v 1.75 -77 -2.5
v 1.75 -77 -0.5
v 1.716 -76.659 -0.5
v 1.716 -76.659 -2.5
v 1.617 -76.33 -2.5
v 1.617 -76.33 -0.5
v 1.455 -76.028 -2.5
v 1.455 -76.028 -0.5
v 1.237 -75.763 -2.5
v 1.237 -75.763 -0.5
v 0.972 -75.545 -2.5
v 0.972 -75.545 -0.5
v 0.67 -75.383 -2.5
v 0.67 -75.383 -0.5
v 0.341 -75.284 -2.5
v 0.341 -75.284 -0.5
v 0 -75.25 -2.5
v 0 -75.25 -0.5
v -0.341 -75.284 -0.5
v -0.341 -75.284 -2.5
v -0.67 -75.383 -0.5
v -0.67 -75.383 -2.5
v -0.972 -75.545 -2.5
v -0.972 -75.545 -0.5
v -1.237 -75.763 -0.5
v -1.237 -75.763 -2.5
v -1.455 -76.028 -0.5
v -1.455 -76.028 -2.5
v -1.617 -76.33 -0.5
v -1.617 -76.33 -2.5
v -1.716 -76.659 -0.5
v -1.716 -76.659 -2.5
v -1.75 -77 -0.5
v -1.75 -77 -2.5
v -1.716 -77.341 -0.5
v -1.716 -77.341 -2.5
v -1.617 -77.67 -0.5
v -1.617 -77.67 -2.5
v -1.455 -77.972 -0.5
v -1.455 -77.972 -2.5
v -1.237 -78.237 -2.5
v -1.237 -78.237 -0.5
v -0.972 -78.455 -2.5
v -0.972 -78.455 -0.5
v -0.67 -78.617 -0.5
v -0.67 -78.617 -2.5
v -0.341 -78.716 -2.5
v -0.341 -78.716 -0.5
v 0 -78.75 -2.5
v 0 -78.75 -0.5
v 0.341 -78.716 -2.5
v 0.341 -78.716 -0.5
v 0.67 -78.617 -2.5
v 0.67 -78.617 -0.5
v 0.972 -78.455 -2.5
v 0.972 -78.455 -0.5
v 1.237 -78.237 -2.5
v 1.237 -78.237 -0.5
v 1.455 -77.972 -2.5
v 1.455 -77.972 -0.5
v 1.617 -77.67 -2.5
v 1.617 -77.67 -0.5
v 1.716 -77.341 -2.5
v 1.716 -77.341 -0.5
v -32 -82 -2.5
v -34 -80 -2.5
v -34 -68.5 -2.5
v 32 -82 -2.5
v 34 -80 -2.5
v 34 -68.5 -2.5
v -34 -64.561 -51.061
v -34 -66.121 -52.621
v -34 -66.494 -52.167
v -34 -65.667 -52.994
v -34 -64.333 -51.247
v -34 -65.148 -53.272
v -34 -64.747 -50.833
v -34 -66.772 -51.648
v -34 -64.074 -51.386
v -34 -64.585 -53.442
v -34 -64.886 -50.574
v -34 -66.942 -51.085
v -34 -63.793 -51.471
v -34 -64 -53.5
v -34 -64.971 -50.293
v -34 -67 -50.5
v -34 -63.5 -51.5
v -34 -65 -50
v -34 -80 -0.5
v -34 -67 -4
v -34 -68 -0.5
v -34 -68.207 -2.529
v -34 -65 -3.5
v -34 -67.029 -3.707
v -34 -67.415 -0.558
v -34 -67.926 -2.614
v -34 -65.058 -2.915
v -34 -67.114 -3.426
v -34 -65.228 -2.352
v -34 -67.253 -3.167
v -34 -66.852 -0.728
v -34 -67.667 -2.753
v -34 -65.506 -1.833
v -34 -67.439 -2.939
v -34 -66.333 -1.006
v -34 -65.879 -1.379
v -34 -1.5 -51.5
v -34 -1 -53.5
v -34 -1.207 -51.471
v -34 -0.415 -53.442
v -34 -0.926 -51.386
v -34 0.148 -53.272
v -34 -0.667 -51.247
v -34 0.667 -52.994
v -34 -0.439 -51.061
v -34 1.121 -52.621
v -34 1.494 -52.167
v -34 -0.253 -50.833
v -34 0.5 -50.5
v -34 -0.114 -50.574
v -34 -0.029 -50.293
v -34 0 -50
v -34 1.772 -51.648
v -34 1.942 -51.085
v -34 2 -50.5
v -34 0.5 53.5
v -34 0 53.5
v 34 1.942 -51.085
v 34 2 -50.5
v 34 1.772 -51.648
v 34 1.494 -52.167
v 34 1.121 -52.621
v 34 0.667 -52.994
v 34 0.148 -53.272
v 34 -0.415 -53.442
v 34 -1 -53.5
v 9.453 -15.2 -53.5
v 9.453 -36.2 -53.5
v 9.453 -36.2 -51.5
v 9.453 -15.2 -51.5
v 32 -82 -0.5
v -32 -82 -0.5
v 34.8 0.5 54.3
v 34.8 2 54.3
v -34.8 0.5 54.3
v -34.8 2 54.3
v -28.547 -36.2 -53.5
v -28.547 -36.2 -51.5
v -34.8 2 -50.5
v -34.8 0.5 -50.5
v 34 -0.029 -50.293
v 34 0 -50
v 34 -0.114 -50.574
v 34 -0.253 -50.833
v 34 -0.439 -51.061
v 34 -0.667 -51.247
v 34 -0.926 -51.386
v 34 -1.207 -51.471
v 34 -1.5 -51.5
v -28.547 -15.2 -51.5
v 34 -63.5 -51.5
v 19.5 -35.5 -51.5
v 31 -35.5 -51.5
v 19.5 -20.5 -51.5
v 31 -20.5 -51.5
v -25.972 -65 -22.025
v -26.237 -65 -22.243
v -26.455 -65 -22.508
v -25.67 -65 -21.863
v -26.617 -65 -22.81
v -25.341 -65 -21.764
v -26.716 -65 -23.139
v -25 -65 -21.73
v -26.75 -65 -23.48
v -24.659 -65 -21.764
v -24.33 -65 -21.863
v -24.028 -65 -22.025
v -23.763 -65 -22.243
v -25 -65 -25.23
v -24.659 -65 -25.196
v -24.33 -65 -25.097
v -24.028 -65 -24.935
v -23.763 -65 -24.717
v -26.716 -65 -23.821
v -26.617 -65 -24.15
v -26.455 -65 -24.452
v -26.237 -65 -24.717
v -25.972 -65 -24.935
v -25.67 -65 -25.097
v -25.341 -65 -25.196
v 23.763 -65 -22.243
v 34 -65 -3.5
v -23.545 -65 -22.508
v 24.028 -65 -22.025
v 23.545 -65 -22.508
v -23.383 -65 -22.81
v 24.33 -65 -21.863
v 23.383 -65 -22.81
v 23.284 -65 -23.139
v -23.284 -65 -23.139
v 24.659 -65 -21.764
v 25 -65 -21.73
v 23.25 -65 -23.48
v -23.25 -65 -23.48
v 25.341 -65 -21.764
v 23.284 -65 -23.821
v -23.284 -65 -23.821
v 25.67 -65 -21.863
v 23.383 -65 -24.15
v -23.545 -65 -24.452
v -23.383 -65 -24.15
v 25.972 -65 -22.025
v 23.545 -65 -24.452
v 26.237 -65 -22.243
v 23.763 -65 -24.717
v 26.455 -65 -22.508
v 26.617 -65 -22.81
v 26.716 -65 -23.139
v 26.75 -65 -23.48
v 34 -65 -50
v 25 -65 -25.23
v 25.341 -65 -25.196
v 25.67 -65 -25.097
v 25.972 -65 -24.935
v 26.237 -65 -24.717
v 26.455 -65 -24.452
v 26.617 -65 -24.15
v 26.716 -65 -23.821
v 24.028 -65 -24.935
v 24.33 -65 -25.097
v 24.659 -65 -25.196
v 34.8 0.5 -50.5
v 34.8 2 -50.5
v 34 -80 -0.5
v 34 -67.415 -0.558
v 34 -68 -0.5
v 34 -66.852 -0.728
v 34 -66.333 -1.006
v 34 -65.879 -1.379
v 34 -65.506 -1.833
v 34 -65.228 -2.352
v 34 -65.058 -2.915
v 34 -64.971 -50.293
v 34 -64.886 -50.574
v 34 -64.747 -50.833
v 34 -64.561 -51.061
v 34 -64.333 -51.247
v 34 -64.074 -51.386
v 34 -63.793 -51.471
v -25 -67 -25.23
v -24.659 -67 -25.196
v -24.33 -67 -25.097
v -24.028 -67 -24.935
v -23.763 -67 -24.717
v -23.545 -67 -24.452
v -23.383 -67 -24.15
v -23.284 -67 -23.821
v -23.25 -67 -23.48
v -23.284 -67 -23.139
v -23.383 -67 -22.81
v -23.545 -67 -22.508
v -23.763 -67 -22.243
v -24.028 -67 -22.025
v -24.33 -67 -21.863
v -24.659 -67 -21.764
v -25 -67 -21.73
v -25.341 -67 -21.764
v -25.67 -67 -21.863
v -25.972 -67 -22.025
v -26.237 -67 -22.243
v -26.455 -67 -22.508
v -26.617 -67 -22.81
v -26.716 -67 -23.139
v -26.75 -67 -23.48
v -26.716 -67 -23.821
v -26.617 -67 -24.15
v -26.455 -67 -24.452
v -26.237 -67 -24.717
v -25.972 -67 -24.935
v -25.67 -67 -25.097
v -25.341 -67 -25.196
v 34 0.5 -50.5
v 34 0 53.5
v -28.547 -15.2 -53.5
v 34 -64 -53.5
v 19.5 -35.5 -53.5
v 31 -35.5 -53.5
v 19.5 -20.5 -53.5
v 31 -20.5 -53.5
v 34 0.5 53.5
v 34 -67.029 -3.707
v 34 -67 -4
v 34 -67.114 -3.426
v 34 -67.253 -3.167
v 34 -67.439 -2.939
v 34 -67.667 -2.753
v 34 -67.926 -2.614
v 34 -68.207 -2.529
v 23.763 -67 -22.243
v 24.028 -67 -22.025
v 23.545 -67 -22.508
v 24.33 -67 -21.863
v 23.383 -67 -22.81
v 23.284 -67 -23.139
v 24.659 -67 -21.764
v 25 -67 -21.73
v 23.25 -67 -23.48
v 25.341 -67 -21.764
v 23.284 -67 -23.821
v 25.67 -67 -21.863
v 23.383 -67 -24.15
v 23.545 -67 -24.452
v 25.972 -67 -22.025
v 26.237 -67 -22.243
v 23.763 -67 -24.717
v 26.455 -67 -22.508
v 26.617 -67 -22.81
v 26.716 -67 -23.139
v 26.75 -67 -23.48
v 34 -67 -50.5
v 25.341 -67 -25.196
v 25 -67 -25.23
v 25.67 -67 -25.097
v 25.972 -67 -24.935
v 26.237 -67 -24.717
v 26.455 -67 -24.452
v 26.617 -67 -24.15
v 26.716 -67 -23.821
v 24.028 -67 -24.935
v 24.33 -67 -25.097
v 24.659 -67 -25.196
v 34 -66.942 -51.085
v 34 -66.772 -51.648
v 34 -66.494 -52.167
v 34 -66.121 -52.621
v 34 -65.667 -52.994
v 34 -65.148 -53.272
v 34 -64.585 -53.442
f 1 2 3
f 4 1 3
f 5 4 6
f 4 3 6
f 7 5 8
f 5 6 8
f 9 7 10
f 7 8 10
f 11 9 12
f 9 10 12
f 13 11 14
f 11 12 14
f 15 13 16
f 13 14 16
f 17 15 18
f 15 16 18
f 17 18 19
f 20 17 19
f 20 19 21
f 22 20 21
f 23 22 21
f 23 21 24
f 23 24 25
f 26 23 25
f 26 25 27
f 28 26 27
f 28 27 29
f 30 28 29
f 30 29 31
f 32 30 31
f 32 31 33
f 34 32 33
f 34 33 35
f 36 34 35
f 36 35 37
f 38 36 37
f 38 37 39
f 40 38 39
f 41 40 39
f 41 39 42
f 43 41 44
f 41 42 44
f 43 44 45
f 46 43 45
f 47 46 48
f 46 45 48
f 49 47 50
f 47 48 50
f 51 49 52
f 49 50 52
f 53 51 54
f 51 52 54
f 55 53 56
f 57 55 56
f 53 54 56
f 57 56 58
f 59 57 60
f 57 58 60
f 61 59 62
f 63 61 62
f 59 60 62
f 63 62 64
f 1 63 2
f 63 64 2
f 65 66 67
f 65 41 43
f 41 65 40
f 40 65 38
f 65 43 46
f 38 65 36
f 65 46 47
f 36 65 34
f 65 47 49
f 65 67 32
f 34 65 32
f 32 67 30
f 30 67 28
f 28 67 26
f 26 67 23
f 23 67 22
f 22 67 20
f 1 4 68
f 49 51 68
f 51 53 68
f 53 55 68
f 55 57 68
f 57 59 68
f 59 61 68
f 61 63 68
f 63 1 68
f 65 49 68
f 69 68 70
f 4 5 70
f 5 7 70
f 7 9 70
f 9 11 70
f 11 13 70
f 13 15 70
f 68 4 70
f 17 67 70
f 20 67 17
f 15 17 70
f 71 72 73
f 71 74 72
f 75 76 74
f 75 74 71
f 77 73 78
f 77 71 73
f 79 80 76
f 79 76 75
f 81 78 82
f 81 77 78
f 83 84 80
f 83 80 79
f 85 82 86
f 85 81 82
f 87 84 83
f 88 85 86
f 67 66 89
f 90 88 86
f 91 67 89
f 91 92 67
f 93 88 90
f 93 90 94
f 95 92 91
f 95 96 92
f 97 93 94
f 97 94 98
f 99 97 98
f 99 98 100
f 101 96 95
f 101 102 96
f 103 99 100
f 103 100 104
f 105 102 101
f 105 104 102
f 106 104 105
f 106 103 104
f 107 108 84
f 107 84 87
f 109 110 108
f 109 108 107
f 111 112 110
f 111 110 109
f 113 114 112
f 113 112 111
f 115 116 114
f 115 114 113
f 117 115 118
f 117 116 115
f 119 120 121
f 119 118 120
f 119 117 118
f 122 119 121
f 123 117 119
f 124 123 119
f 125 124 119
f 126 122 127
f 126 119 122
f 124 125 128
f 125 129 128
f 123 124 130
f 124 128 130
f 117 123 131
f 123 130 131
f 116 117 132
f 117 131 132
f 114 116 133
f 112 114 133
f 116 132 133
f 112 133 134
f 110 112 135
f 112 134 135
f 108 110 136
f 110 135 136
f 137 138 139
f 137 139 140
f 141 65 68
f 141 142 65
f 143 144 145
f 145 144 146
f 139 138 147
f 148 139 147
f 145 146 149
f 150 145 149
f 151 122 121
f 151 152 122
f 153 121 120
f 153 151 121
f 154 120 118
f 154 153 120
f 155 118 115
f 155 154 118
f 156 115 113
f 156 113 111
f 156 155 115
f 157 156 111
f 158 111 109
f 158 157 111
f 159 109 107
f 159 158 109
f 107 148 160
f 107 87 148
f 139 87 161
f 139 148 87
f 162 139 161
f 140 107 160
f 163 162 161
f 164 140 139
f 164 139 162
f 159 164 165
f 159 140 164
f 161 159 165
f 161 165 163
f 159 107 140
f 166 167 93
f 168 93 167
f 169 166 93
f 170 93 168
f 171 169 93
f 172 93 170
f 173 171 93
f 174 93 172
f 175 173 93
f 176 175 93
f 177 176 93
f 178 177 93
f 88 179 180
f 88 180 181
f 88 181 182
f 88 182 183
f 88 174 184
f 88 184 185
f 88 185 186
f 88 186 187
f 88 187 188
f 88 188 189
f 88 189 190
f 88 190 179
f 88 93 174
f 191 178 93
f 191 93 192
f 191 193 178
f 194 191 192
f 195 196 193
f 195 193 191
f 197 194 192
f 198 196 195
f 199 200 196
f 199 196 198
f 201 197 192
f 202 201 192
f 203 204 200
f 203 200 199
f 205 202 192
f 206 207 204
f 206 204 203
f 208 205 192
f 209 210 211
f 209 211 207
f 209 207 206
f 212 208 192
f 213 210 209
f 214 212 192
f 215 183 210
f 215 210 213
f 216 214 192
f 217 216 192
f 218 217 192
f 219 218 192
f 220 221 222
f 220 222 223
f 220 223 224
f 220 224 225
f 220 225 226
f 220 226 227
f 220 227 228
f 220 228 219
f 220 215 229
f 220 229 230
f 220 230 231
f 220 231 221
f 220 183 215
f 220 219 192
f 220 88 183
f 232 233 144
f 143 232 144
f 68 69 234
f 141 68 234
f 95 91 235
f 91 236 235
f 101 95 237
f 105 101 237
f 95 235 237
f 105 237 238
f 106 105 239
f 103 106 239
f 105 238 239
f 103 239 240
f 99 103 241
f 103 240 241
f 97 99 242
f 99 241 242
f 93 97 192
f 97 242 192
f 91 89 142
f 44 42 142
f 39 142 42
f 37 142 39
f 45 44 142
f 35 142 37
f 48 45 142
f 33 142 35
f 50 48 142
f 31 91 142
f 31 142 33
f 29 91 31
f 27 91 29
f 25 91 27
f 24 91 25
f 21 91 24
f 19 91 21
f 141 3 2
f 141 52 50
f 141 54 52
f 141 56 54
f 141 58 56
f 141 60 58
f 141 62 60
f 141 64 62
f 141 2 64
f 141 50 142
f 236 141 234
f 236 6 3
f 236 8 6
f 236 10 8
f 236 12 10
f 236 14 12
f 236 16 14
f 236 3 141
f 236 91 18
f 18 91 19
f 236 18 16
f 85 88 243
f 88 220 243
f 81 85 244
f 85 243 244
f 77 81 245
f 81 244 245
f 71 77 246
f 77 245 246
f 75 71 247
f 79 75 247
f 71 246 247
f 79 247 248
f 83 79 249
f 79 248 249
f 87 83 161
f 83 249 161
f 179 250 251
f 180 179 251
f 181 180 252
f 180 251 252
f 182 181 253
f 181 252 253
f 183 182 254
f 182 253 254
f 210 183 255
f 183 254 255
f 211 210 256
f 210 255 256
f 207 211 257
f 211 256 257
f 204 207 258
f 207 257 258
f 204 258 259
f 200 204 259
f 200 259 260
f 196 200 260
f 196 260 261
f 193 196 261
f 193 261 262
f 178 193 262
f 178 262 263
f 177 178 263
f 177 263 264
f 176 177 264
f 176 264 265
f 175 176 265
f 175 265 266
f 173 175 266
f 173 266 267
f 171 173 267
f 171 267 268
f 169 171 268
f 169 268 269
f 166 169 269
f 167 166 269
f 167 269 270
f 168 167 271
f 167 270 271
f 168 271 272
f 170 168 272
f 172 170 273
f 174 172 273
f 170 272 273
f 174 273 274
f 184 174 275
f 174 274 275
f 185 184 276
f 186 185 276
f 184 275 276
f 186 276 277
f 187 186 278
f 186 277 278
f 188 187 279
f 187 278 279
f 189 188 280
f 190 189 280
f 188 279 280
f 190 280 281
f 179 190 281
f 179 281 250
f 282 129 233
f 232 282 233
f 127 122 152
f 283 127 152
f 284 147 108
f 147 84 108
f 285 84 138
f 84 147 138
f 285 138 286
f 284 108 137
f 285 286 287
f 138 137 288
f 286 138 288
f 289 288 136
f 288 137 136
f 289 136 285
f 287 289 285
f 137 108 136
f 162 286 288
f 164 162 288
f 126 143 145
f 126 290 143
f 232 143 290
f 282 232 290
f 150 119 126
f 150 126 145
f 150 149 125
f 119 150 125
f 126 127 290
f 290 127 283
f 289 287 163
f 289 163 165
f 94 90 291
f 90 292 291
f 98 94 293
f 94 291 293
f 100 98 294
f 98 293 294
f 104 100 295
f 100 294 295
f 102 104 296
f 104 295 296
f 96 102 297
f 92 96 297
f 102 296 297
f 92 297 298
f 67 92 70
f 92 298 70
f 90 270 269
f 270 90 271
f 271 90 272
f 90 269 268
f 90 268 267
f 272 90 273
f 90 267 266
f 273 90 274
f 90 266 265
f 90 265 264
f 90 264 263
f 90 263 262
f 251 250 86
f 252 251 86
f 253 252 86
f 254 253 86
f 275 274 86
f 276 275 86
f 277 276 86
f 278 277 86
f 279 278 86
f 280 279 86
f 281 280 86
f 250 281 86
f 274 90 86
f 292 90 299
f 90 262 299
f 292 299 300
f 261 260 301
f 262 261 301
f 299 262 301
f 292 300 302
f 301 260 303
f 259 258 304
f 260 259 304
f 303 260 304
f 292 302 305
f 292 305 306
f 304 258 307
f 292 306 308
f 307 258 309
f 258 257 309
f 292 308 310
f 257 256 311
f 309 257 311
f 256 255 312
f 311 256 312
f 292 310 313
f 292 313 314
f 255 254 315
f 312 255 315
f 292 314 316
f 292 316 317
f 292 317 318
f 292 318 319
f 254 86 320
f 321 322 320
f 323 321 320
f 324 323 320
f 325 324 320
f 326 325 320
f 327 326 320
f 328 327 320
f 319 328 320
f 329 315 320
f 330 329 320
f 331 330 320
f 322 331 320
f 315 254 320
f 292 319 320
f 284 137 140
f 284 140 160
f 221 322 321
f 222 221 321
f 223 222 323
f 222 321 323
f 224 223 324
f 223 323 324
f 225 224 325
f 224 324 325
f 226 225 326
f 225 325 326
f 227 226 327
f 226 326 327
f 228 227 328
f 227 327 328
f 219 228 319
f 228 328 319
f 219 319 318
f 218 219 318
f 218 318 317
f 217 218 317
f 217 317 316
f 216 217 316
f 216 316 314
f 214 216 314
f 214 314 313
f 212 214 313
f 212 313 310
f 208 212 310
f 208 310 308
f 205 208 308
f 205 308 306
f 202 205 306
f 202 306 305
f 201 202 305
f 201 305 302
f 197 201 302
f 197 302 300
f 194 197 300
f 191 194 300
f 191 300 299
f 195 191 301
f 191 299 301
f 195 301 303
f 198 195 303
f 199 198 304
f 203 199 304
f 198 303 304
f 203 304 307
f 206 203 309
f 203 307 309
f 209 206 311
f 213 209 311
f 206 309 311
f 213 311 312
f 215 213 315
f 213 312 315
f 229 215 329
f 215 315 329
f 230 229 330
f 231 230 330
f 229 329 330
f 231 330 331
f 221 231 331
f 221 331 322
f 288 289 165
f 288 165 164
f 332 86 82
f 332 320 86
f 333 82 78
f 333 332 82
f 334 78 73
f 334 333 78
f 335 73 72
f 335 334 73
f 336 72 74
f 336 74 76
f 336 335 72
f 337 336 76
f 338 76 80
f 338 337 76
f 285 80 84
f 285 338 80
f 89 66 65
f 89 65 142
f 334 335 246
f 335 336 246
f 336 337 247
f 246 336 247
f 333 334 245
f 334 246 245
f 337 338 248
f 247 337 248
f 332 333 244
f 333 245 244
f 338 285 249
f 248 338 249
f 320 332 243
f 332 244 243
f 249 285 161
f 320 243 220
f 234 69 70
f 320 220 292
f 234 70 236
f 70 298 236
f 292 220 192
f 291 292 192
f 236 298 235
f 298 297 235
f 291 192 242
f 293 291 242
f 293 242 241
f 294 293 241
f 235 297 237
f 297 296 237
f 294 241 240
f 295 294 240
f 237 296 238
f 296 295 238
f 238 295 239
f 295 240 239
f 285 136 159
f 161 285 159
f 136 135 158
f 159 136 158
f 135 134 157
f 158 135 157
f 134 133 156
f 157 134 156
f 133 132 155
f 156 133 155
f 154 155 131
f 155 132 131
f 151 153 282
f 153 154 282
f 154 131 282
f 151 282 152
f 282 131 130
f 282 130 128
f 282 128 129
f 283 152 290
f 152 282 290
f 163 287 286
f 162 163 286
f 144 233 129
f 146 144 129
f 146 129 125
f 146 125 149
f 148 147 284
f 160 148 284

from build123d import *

# Parameters (mm, degrees)
SKETCH1_W           = 68
SKETCH1_H           = 107
BOSS_EXTRUDE1_DEPTH = 2
SKETCH2_W           = 68
SKETCH2_H           = 2
BOSS_EXTRUDE2_DEPTH = 67
CUT_EXTRUDE2_REACH  = 132.744
SKETCH4_W           = 11.5
SKETCH4_H           = 15
SKETCH4_W_2         = 38
SKETCH4_H_2         = 21
SKETCH5_W           = 68
SKETCH5_H           = 2
BOSS_EXTRUDE3_DEPTH = 51
SKETCH6_W           = 68
SKETCH6_H           = 2
BOSS_EXTRUDE4_DEPTH = 15
BOSS_EXTRUDE5_DEPTH = 1.5
CUT_EXTRUDE4_REACH  = 96.449
SKETCH9_R           = 1.75
FILLET1_R           = 1.5
FILLET2_R           = 3
FILLET3_R           = 1.5
FILLET4_R           = 3
FILLET5_R           = 1.5
FILLET6_R           = 3
CUT_EXTRUDE5_REACH  = 106.585
SKETCH10_R          = 1.75
CHAMFER1_SIZE       = 2


with BuildPart() as part:
    # Sketch1 → Boss-Extrude1 (new body)
    with BuildSketch(Plane(origin=(0, 0, 0), x_dir=(1, 0, 0), z_dir=(0, 1, 0))):
        Rectangle(SKETCH1_W, SKETCH1_H)
    extrude(amount=BOSS_EXTRUDE1_DEPTH)

    # Sketch2 → Boss-Extrude2 (add)
    with BuildSketch(Plane.XZ):
        with Locations((0, -52.5)):
            Rectangle(SKETCH2_W, SKETCH2_H)
    extrude(amount=BOSS_EXTRUDE2_DEPTH)

    # Sketch4 → Cut-Extrude2 (cut, up to next)
    with BuildSketch(Plane(origin=(0, 0, -53.5), x_dir=(-1, 0, 0), z_dir=(0, 0, -1)), mode=Mode.PRIVATE) as cut_extrude2_sk1:
        with Locations((-25.25, -28)):
            Rectangle(SKETCH4_W, SKETCH4_H)
    cut_extrude2_tool1 = extrude(cut_extrude2_sk1.sketch, amount=-CUT_EXTRUDE2_REACH, mode=Mode.PRIVATE) & part.part
    # Sketch4 → Cut-Extrude2 (cut, up to next)
    with BuildSketch(Plane(origin=(0, 0, -53.5), x_dir=(-1, 0, 0), z_dir=(0, 0, -1)), mode=Mode.PRIVATE) as cut_extrude2_sk2:
        with Locations((9.546940835, -25.7)):
            Rectangle(SKETCH4_W_2, SKETCH4_H_2)
    cut_extrude2_tool2 = extrude(cut_extrude2_sk2.sketch, amount=-CUT_EXTRUDE2_REACH, mode=Mode.PRIVATE) & part.part
    add(cut_extrude2_tool1.solids().sort_by_distance((25.25, -28, -53.5))[0], mode=Mode.SUBTRACT)
    add(cut_extrude2_tool2.solids().sort_by_distance((-9.546941, -25.7, -53.5))[0], mode=Mode.SUBTRACT)

    # Sketch5 → Boss-Extrude3 (add)
    with BuildSketch(Plane.XY.offset(-51.5)):
        with Locations((0, -66)):
            Rectangle(SKETCH5_W, SKETCH5_H)
    extrude(amount=BOSS_EXTRUDE3_DEPTH)

    # Sketch6 → Boss-Extrude4 (add)
    with BuildSketch(Plane.XZ.offset(67)):
        with Locations((0, -1.5)):
            Rectangle(SKETCH6_W, SKETCH6_H)
    extrude(amount=BOSS_EXTRUDE4_DEPTH)

    # Sketch8 → Boss-Extrude5 (add)
    with BuildSketch(Plane(origin=(0, 2, 0), x_dir=(1, 0, 0), z_dir=(0, 1, 0))):
        Polygon((-34.8, 50.5), (-34, 50.5), (-34, -53.5), (34, -53.5), (34, 50.5), (34.8, 50.5), (34.8, -54.3), (-34.8, -54.3), align=None)
    extrude(amount=-BOSS_EXTRUDE5_DEPTH)

    # Sketch9 → Cut-Extrude4 (cut, up to next)
    with BuildSketch(Plane.XZ.offset(67), mode=Mode.PRIVATE) as cut_extrude4_sk1:
        with Locations(Location((-25, -23.48, 0), (0, 0, 270))):
            Circle(SKETCH9_R)
    cut_extrude4_tool1 = extrude(cut_extrude4_sk1.sketch, amount=-CUT_EXTRUDE4_REACH, mode=Mode.PRIVATE) & part.part
    # Sketch9 → Cut-Extrude4 (cut, up to next)
    with BuildSketch(Plane.XZ.offset(67), mode=Mode.PRIVATE) as cut_extrude4_sk2:
        with Locations(Location((25, -23.48, 0), (0, 0, 270))):
            Circle(SKETCH9_R)
    cut_extrude4_tool2 = extrude(cut_extrude4_sk2.sketch, amount=-CUT_EXTRUDE4_REACH, mode=Mode.PRIVATE) & part.part
    add(cut_extrude4_tool1.solids().sort_by_distance((-25, -67, -23.48))[0], mode=Mode.SUBTRACT)
    add(cut_extrude4_tool2.solids().sort_by_distance((25, -67, -23.48))[0], mode=Mode.SUBTRACT)

    # Fillet1
    fillet1_edges = [part.edges().sort_by_distance(p)[0] for p in [
        (0, -67, -2.5),
    ]]
    fillet(fillet1_edges, radius=FILLET1_R)

    # Fillet2
    fillet2_edges = [part.edges().sort_by_distance(p)[0] for p in [
        (0, -65, -0.5),
    ]]
    fillet(fillet2_edges, radius=FILLET2_R)

    # Fillet3
    fillet3_edges = [part.edges().sort_by_distance(p)[0] for p in [
        (0, -65, -51.5),
    ]]
    fillet(fillet3_edges, radius=FILLET3_R)

    # Fillet4
    fillet4_edges = [part.edges().sort_by_distance(p)[0] for p in [
        (0, -67, -53.5),
    ]]
    fillet(fillet4_edges, radius=FILLET4_R)

    # Fillet5
    fillet5_edges = [part.edges().sort_by_distance(p)[0] for p in [
        (0, 0, -51.5),
    ]]
    fillet(fillet5_edges, radius=FILLET5_R)

    # Fillet6
    fillet6_edges = [part.edges().sort_by_distance(p)[0] for p in [
        (0, 2, -53.5),
    ]]
    fillet(fillet6_edges, radius=FILLET6_R)

    # Sketch10 → Cut-Extrude5 (cut, up to next)
    with BuildSketch(Plane.XY.offset(-0.5), mode=Mode.PRIVATE) as cut_extrude5_sk1:
        with Locations((0, -77)):
            Circle(SKETCH10_R)
    cut_extrude5_tool1 = extrude(cut_extrude5_sk1.sketch, amount=-CUT_EXTRUDE5_REACH, mode=Mode.PRIVATE) & part.part
    add(cut_extrude5_tool1.solids().sort_by_distance((0, -77, -0.5))[0], mode=Mode.SUBTRACT)

    # Chamfer1
    chamfer1_edges = [part.edges().sort_by_distance(p)[0] for p in [
        (-34, -82, -1.5),
        (34, -82, -1.5),
    ]]
    chamfer(chamfer1_edges, length=CHAMFER1_SIZE)


solid = part.part
